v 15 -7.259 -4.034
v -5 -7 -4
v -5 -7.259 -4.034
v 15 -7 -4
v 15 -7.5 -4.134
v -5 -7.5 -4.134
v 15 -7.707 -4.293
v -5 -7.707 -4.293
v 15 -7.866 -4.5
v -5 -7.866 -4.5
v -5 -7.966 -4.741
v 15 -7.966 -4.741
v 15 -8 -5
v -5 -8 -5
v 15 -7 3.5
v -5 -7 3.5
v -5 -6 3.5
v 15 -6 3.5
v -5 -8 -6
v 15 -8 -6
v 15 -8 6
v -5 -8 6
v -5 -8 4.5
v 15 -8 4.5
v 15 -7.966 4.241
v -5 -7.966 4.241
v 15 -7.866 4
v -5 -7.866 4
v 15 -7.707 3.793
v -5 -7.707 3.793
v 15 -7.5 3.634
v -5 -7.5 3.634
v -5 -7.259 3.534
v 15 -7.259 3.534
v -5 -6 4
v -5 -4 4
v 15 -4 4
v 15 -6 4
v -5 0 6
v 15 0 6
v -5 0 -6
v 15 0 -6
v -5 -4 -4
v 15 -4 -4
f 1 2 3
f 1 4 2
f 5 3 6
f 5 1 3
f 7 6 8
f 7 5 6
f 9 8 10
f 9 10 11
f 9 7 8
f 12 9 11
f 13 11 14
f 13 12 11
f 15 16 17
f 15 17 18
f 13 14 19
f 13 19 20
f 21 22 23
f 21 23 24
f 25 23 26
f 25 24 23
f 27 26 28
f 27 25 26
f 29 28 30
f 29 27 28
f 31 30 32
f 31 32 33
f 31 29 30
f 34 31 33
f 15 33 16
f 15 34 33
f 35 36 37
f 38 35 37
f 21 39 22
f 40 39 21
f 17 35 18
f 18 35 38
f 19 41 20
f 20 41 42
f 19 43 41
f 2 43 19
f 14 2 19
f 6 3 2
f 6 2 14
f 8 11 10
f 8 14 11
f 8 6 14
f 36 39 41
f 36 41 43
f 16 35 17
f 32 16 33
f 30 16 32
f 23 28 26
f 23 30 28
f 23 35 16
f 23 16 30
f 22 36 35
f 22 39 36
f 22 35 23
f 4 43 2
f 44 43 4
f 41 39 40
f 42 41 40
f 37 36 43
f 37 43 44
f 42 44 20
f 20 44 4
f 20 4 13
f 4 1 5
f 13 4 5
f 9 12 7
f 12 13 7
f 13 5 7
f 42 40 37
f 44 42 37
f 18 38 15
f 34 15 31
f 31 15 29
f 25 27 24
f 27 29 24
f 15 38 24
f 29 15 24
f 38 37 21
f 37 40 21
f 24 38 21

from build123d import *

# Parameters (mm, degrees)
F0_W     = 20
F0_H     = 8
F1_DEPTH = 4
F0_H_2   = 2
F2_DEPTH = 8
F3_W     = 20
F3_H     = 2
F4_DEPTH = 0.5
F5_R     = 1


with BuildPart() as f1:
    # F0 (on Front) → F1 (new body)
    with BuildSketch(Plane.XZ):
        with Locations((5, 0)):
            Rectangle(F0_W, F0_H)
    extrude(amount=F1_DEPTH)

    # F0 (on Front) → F2 (join)
    with BuildSketch(Plane.XZ):
        with Locations((5, 5)):
            Rectangle(F0_W, F0_H_2)
        with Locations((5, -5)):
            Rectangle(F0_W, F0_H_2)
    extrude(amount=F2_DEPTH)

    # F3 (on face) → F4 (join)
    with BuildSketch(Plane(origin=(0, 0, 4), x_dir=(1, 0, 0), z_dir=(0, 0, -1))):
        with Locations((5, 7)):
            Rectangle(F3_W, F3_H)
    extrude(amount=F4_DEPTH)

    # F5
    f5_edges = [f1.edges().sort_by_distance(p)[0] for p in [
        (5, -8, 3.5),
        (5, -8, -4),
    ]]
    fillet(f5_edges, radius=F5_R)


solid = f1.part
